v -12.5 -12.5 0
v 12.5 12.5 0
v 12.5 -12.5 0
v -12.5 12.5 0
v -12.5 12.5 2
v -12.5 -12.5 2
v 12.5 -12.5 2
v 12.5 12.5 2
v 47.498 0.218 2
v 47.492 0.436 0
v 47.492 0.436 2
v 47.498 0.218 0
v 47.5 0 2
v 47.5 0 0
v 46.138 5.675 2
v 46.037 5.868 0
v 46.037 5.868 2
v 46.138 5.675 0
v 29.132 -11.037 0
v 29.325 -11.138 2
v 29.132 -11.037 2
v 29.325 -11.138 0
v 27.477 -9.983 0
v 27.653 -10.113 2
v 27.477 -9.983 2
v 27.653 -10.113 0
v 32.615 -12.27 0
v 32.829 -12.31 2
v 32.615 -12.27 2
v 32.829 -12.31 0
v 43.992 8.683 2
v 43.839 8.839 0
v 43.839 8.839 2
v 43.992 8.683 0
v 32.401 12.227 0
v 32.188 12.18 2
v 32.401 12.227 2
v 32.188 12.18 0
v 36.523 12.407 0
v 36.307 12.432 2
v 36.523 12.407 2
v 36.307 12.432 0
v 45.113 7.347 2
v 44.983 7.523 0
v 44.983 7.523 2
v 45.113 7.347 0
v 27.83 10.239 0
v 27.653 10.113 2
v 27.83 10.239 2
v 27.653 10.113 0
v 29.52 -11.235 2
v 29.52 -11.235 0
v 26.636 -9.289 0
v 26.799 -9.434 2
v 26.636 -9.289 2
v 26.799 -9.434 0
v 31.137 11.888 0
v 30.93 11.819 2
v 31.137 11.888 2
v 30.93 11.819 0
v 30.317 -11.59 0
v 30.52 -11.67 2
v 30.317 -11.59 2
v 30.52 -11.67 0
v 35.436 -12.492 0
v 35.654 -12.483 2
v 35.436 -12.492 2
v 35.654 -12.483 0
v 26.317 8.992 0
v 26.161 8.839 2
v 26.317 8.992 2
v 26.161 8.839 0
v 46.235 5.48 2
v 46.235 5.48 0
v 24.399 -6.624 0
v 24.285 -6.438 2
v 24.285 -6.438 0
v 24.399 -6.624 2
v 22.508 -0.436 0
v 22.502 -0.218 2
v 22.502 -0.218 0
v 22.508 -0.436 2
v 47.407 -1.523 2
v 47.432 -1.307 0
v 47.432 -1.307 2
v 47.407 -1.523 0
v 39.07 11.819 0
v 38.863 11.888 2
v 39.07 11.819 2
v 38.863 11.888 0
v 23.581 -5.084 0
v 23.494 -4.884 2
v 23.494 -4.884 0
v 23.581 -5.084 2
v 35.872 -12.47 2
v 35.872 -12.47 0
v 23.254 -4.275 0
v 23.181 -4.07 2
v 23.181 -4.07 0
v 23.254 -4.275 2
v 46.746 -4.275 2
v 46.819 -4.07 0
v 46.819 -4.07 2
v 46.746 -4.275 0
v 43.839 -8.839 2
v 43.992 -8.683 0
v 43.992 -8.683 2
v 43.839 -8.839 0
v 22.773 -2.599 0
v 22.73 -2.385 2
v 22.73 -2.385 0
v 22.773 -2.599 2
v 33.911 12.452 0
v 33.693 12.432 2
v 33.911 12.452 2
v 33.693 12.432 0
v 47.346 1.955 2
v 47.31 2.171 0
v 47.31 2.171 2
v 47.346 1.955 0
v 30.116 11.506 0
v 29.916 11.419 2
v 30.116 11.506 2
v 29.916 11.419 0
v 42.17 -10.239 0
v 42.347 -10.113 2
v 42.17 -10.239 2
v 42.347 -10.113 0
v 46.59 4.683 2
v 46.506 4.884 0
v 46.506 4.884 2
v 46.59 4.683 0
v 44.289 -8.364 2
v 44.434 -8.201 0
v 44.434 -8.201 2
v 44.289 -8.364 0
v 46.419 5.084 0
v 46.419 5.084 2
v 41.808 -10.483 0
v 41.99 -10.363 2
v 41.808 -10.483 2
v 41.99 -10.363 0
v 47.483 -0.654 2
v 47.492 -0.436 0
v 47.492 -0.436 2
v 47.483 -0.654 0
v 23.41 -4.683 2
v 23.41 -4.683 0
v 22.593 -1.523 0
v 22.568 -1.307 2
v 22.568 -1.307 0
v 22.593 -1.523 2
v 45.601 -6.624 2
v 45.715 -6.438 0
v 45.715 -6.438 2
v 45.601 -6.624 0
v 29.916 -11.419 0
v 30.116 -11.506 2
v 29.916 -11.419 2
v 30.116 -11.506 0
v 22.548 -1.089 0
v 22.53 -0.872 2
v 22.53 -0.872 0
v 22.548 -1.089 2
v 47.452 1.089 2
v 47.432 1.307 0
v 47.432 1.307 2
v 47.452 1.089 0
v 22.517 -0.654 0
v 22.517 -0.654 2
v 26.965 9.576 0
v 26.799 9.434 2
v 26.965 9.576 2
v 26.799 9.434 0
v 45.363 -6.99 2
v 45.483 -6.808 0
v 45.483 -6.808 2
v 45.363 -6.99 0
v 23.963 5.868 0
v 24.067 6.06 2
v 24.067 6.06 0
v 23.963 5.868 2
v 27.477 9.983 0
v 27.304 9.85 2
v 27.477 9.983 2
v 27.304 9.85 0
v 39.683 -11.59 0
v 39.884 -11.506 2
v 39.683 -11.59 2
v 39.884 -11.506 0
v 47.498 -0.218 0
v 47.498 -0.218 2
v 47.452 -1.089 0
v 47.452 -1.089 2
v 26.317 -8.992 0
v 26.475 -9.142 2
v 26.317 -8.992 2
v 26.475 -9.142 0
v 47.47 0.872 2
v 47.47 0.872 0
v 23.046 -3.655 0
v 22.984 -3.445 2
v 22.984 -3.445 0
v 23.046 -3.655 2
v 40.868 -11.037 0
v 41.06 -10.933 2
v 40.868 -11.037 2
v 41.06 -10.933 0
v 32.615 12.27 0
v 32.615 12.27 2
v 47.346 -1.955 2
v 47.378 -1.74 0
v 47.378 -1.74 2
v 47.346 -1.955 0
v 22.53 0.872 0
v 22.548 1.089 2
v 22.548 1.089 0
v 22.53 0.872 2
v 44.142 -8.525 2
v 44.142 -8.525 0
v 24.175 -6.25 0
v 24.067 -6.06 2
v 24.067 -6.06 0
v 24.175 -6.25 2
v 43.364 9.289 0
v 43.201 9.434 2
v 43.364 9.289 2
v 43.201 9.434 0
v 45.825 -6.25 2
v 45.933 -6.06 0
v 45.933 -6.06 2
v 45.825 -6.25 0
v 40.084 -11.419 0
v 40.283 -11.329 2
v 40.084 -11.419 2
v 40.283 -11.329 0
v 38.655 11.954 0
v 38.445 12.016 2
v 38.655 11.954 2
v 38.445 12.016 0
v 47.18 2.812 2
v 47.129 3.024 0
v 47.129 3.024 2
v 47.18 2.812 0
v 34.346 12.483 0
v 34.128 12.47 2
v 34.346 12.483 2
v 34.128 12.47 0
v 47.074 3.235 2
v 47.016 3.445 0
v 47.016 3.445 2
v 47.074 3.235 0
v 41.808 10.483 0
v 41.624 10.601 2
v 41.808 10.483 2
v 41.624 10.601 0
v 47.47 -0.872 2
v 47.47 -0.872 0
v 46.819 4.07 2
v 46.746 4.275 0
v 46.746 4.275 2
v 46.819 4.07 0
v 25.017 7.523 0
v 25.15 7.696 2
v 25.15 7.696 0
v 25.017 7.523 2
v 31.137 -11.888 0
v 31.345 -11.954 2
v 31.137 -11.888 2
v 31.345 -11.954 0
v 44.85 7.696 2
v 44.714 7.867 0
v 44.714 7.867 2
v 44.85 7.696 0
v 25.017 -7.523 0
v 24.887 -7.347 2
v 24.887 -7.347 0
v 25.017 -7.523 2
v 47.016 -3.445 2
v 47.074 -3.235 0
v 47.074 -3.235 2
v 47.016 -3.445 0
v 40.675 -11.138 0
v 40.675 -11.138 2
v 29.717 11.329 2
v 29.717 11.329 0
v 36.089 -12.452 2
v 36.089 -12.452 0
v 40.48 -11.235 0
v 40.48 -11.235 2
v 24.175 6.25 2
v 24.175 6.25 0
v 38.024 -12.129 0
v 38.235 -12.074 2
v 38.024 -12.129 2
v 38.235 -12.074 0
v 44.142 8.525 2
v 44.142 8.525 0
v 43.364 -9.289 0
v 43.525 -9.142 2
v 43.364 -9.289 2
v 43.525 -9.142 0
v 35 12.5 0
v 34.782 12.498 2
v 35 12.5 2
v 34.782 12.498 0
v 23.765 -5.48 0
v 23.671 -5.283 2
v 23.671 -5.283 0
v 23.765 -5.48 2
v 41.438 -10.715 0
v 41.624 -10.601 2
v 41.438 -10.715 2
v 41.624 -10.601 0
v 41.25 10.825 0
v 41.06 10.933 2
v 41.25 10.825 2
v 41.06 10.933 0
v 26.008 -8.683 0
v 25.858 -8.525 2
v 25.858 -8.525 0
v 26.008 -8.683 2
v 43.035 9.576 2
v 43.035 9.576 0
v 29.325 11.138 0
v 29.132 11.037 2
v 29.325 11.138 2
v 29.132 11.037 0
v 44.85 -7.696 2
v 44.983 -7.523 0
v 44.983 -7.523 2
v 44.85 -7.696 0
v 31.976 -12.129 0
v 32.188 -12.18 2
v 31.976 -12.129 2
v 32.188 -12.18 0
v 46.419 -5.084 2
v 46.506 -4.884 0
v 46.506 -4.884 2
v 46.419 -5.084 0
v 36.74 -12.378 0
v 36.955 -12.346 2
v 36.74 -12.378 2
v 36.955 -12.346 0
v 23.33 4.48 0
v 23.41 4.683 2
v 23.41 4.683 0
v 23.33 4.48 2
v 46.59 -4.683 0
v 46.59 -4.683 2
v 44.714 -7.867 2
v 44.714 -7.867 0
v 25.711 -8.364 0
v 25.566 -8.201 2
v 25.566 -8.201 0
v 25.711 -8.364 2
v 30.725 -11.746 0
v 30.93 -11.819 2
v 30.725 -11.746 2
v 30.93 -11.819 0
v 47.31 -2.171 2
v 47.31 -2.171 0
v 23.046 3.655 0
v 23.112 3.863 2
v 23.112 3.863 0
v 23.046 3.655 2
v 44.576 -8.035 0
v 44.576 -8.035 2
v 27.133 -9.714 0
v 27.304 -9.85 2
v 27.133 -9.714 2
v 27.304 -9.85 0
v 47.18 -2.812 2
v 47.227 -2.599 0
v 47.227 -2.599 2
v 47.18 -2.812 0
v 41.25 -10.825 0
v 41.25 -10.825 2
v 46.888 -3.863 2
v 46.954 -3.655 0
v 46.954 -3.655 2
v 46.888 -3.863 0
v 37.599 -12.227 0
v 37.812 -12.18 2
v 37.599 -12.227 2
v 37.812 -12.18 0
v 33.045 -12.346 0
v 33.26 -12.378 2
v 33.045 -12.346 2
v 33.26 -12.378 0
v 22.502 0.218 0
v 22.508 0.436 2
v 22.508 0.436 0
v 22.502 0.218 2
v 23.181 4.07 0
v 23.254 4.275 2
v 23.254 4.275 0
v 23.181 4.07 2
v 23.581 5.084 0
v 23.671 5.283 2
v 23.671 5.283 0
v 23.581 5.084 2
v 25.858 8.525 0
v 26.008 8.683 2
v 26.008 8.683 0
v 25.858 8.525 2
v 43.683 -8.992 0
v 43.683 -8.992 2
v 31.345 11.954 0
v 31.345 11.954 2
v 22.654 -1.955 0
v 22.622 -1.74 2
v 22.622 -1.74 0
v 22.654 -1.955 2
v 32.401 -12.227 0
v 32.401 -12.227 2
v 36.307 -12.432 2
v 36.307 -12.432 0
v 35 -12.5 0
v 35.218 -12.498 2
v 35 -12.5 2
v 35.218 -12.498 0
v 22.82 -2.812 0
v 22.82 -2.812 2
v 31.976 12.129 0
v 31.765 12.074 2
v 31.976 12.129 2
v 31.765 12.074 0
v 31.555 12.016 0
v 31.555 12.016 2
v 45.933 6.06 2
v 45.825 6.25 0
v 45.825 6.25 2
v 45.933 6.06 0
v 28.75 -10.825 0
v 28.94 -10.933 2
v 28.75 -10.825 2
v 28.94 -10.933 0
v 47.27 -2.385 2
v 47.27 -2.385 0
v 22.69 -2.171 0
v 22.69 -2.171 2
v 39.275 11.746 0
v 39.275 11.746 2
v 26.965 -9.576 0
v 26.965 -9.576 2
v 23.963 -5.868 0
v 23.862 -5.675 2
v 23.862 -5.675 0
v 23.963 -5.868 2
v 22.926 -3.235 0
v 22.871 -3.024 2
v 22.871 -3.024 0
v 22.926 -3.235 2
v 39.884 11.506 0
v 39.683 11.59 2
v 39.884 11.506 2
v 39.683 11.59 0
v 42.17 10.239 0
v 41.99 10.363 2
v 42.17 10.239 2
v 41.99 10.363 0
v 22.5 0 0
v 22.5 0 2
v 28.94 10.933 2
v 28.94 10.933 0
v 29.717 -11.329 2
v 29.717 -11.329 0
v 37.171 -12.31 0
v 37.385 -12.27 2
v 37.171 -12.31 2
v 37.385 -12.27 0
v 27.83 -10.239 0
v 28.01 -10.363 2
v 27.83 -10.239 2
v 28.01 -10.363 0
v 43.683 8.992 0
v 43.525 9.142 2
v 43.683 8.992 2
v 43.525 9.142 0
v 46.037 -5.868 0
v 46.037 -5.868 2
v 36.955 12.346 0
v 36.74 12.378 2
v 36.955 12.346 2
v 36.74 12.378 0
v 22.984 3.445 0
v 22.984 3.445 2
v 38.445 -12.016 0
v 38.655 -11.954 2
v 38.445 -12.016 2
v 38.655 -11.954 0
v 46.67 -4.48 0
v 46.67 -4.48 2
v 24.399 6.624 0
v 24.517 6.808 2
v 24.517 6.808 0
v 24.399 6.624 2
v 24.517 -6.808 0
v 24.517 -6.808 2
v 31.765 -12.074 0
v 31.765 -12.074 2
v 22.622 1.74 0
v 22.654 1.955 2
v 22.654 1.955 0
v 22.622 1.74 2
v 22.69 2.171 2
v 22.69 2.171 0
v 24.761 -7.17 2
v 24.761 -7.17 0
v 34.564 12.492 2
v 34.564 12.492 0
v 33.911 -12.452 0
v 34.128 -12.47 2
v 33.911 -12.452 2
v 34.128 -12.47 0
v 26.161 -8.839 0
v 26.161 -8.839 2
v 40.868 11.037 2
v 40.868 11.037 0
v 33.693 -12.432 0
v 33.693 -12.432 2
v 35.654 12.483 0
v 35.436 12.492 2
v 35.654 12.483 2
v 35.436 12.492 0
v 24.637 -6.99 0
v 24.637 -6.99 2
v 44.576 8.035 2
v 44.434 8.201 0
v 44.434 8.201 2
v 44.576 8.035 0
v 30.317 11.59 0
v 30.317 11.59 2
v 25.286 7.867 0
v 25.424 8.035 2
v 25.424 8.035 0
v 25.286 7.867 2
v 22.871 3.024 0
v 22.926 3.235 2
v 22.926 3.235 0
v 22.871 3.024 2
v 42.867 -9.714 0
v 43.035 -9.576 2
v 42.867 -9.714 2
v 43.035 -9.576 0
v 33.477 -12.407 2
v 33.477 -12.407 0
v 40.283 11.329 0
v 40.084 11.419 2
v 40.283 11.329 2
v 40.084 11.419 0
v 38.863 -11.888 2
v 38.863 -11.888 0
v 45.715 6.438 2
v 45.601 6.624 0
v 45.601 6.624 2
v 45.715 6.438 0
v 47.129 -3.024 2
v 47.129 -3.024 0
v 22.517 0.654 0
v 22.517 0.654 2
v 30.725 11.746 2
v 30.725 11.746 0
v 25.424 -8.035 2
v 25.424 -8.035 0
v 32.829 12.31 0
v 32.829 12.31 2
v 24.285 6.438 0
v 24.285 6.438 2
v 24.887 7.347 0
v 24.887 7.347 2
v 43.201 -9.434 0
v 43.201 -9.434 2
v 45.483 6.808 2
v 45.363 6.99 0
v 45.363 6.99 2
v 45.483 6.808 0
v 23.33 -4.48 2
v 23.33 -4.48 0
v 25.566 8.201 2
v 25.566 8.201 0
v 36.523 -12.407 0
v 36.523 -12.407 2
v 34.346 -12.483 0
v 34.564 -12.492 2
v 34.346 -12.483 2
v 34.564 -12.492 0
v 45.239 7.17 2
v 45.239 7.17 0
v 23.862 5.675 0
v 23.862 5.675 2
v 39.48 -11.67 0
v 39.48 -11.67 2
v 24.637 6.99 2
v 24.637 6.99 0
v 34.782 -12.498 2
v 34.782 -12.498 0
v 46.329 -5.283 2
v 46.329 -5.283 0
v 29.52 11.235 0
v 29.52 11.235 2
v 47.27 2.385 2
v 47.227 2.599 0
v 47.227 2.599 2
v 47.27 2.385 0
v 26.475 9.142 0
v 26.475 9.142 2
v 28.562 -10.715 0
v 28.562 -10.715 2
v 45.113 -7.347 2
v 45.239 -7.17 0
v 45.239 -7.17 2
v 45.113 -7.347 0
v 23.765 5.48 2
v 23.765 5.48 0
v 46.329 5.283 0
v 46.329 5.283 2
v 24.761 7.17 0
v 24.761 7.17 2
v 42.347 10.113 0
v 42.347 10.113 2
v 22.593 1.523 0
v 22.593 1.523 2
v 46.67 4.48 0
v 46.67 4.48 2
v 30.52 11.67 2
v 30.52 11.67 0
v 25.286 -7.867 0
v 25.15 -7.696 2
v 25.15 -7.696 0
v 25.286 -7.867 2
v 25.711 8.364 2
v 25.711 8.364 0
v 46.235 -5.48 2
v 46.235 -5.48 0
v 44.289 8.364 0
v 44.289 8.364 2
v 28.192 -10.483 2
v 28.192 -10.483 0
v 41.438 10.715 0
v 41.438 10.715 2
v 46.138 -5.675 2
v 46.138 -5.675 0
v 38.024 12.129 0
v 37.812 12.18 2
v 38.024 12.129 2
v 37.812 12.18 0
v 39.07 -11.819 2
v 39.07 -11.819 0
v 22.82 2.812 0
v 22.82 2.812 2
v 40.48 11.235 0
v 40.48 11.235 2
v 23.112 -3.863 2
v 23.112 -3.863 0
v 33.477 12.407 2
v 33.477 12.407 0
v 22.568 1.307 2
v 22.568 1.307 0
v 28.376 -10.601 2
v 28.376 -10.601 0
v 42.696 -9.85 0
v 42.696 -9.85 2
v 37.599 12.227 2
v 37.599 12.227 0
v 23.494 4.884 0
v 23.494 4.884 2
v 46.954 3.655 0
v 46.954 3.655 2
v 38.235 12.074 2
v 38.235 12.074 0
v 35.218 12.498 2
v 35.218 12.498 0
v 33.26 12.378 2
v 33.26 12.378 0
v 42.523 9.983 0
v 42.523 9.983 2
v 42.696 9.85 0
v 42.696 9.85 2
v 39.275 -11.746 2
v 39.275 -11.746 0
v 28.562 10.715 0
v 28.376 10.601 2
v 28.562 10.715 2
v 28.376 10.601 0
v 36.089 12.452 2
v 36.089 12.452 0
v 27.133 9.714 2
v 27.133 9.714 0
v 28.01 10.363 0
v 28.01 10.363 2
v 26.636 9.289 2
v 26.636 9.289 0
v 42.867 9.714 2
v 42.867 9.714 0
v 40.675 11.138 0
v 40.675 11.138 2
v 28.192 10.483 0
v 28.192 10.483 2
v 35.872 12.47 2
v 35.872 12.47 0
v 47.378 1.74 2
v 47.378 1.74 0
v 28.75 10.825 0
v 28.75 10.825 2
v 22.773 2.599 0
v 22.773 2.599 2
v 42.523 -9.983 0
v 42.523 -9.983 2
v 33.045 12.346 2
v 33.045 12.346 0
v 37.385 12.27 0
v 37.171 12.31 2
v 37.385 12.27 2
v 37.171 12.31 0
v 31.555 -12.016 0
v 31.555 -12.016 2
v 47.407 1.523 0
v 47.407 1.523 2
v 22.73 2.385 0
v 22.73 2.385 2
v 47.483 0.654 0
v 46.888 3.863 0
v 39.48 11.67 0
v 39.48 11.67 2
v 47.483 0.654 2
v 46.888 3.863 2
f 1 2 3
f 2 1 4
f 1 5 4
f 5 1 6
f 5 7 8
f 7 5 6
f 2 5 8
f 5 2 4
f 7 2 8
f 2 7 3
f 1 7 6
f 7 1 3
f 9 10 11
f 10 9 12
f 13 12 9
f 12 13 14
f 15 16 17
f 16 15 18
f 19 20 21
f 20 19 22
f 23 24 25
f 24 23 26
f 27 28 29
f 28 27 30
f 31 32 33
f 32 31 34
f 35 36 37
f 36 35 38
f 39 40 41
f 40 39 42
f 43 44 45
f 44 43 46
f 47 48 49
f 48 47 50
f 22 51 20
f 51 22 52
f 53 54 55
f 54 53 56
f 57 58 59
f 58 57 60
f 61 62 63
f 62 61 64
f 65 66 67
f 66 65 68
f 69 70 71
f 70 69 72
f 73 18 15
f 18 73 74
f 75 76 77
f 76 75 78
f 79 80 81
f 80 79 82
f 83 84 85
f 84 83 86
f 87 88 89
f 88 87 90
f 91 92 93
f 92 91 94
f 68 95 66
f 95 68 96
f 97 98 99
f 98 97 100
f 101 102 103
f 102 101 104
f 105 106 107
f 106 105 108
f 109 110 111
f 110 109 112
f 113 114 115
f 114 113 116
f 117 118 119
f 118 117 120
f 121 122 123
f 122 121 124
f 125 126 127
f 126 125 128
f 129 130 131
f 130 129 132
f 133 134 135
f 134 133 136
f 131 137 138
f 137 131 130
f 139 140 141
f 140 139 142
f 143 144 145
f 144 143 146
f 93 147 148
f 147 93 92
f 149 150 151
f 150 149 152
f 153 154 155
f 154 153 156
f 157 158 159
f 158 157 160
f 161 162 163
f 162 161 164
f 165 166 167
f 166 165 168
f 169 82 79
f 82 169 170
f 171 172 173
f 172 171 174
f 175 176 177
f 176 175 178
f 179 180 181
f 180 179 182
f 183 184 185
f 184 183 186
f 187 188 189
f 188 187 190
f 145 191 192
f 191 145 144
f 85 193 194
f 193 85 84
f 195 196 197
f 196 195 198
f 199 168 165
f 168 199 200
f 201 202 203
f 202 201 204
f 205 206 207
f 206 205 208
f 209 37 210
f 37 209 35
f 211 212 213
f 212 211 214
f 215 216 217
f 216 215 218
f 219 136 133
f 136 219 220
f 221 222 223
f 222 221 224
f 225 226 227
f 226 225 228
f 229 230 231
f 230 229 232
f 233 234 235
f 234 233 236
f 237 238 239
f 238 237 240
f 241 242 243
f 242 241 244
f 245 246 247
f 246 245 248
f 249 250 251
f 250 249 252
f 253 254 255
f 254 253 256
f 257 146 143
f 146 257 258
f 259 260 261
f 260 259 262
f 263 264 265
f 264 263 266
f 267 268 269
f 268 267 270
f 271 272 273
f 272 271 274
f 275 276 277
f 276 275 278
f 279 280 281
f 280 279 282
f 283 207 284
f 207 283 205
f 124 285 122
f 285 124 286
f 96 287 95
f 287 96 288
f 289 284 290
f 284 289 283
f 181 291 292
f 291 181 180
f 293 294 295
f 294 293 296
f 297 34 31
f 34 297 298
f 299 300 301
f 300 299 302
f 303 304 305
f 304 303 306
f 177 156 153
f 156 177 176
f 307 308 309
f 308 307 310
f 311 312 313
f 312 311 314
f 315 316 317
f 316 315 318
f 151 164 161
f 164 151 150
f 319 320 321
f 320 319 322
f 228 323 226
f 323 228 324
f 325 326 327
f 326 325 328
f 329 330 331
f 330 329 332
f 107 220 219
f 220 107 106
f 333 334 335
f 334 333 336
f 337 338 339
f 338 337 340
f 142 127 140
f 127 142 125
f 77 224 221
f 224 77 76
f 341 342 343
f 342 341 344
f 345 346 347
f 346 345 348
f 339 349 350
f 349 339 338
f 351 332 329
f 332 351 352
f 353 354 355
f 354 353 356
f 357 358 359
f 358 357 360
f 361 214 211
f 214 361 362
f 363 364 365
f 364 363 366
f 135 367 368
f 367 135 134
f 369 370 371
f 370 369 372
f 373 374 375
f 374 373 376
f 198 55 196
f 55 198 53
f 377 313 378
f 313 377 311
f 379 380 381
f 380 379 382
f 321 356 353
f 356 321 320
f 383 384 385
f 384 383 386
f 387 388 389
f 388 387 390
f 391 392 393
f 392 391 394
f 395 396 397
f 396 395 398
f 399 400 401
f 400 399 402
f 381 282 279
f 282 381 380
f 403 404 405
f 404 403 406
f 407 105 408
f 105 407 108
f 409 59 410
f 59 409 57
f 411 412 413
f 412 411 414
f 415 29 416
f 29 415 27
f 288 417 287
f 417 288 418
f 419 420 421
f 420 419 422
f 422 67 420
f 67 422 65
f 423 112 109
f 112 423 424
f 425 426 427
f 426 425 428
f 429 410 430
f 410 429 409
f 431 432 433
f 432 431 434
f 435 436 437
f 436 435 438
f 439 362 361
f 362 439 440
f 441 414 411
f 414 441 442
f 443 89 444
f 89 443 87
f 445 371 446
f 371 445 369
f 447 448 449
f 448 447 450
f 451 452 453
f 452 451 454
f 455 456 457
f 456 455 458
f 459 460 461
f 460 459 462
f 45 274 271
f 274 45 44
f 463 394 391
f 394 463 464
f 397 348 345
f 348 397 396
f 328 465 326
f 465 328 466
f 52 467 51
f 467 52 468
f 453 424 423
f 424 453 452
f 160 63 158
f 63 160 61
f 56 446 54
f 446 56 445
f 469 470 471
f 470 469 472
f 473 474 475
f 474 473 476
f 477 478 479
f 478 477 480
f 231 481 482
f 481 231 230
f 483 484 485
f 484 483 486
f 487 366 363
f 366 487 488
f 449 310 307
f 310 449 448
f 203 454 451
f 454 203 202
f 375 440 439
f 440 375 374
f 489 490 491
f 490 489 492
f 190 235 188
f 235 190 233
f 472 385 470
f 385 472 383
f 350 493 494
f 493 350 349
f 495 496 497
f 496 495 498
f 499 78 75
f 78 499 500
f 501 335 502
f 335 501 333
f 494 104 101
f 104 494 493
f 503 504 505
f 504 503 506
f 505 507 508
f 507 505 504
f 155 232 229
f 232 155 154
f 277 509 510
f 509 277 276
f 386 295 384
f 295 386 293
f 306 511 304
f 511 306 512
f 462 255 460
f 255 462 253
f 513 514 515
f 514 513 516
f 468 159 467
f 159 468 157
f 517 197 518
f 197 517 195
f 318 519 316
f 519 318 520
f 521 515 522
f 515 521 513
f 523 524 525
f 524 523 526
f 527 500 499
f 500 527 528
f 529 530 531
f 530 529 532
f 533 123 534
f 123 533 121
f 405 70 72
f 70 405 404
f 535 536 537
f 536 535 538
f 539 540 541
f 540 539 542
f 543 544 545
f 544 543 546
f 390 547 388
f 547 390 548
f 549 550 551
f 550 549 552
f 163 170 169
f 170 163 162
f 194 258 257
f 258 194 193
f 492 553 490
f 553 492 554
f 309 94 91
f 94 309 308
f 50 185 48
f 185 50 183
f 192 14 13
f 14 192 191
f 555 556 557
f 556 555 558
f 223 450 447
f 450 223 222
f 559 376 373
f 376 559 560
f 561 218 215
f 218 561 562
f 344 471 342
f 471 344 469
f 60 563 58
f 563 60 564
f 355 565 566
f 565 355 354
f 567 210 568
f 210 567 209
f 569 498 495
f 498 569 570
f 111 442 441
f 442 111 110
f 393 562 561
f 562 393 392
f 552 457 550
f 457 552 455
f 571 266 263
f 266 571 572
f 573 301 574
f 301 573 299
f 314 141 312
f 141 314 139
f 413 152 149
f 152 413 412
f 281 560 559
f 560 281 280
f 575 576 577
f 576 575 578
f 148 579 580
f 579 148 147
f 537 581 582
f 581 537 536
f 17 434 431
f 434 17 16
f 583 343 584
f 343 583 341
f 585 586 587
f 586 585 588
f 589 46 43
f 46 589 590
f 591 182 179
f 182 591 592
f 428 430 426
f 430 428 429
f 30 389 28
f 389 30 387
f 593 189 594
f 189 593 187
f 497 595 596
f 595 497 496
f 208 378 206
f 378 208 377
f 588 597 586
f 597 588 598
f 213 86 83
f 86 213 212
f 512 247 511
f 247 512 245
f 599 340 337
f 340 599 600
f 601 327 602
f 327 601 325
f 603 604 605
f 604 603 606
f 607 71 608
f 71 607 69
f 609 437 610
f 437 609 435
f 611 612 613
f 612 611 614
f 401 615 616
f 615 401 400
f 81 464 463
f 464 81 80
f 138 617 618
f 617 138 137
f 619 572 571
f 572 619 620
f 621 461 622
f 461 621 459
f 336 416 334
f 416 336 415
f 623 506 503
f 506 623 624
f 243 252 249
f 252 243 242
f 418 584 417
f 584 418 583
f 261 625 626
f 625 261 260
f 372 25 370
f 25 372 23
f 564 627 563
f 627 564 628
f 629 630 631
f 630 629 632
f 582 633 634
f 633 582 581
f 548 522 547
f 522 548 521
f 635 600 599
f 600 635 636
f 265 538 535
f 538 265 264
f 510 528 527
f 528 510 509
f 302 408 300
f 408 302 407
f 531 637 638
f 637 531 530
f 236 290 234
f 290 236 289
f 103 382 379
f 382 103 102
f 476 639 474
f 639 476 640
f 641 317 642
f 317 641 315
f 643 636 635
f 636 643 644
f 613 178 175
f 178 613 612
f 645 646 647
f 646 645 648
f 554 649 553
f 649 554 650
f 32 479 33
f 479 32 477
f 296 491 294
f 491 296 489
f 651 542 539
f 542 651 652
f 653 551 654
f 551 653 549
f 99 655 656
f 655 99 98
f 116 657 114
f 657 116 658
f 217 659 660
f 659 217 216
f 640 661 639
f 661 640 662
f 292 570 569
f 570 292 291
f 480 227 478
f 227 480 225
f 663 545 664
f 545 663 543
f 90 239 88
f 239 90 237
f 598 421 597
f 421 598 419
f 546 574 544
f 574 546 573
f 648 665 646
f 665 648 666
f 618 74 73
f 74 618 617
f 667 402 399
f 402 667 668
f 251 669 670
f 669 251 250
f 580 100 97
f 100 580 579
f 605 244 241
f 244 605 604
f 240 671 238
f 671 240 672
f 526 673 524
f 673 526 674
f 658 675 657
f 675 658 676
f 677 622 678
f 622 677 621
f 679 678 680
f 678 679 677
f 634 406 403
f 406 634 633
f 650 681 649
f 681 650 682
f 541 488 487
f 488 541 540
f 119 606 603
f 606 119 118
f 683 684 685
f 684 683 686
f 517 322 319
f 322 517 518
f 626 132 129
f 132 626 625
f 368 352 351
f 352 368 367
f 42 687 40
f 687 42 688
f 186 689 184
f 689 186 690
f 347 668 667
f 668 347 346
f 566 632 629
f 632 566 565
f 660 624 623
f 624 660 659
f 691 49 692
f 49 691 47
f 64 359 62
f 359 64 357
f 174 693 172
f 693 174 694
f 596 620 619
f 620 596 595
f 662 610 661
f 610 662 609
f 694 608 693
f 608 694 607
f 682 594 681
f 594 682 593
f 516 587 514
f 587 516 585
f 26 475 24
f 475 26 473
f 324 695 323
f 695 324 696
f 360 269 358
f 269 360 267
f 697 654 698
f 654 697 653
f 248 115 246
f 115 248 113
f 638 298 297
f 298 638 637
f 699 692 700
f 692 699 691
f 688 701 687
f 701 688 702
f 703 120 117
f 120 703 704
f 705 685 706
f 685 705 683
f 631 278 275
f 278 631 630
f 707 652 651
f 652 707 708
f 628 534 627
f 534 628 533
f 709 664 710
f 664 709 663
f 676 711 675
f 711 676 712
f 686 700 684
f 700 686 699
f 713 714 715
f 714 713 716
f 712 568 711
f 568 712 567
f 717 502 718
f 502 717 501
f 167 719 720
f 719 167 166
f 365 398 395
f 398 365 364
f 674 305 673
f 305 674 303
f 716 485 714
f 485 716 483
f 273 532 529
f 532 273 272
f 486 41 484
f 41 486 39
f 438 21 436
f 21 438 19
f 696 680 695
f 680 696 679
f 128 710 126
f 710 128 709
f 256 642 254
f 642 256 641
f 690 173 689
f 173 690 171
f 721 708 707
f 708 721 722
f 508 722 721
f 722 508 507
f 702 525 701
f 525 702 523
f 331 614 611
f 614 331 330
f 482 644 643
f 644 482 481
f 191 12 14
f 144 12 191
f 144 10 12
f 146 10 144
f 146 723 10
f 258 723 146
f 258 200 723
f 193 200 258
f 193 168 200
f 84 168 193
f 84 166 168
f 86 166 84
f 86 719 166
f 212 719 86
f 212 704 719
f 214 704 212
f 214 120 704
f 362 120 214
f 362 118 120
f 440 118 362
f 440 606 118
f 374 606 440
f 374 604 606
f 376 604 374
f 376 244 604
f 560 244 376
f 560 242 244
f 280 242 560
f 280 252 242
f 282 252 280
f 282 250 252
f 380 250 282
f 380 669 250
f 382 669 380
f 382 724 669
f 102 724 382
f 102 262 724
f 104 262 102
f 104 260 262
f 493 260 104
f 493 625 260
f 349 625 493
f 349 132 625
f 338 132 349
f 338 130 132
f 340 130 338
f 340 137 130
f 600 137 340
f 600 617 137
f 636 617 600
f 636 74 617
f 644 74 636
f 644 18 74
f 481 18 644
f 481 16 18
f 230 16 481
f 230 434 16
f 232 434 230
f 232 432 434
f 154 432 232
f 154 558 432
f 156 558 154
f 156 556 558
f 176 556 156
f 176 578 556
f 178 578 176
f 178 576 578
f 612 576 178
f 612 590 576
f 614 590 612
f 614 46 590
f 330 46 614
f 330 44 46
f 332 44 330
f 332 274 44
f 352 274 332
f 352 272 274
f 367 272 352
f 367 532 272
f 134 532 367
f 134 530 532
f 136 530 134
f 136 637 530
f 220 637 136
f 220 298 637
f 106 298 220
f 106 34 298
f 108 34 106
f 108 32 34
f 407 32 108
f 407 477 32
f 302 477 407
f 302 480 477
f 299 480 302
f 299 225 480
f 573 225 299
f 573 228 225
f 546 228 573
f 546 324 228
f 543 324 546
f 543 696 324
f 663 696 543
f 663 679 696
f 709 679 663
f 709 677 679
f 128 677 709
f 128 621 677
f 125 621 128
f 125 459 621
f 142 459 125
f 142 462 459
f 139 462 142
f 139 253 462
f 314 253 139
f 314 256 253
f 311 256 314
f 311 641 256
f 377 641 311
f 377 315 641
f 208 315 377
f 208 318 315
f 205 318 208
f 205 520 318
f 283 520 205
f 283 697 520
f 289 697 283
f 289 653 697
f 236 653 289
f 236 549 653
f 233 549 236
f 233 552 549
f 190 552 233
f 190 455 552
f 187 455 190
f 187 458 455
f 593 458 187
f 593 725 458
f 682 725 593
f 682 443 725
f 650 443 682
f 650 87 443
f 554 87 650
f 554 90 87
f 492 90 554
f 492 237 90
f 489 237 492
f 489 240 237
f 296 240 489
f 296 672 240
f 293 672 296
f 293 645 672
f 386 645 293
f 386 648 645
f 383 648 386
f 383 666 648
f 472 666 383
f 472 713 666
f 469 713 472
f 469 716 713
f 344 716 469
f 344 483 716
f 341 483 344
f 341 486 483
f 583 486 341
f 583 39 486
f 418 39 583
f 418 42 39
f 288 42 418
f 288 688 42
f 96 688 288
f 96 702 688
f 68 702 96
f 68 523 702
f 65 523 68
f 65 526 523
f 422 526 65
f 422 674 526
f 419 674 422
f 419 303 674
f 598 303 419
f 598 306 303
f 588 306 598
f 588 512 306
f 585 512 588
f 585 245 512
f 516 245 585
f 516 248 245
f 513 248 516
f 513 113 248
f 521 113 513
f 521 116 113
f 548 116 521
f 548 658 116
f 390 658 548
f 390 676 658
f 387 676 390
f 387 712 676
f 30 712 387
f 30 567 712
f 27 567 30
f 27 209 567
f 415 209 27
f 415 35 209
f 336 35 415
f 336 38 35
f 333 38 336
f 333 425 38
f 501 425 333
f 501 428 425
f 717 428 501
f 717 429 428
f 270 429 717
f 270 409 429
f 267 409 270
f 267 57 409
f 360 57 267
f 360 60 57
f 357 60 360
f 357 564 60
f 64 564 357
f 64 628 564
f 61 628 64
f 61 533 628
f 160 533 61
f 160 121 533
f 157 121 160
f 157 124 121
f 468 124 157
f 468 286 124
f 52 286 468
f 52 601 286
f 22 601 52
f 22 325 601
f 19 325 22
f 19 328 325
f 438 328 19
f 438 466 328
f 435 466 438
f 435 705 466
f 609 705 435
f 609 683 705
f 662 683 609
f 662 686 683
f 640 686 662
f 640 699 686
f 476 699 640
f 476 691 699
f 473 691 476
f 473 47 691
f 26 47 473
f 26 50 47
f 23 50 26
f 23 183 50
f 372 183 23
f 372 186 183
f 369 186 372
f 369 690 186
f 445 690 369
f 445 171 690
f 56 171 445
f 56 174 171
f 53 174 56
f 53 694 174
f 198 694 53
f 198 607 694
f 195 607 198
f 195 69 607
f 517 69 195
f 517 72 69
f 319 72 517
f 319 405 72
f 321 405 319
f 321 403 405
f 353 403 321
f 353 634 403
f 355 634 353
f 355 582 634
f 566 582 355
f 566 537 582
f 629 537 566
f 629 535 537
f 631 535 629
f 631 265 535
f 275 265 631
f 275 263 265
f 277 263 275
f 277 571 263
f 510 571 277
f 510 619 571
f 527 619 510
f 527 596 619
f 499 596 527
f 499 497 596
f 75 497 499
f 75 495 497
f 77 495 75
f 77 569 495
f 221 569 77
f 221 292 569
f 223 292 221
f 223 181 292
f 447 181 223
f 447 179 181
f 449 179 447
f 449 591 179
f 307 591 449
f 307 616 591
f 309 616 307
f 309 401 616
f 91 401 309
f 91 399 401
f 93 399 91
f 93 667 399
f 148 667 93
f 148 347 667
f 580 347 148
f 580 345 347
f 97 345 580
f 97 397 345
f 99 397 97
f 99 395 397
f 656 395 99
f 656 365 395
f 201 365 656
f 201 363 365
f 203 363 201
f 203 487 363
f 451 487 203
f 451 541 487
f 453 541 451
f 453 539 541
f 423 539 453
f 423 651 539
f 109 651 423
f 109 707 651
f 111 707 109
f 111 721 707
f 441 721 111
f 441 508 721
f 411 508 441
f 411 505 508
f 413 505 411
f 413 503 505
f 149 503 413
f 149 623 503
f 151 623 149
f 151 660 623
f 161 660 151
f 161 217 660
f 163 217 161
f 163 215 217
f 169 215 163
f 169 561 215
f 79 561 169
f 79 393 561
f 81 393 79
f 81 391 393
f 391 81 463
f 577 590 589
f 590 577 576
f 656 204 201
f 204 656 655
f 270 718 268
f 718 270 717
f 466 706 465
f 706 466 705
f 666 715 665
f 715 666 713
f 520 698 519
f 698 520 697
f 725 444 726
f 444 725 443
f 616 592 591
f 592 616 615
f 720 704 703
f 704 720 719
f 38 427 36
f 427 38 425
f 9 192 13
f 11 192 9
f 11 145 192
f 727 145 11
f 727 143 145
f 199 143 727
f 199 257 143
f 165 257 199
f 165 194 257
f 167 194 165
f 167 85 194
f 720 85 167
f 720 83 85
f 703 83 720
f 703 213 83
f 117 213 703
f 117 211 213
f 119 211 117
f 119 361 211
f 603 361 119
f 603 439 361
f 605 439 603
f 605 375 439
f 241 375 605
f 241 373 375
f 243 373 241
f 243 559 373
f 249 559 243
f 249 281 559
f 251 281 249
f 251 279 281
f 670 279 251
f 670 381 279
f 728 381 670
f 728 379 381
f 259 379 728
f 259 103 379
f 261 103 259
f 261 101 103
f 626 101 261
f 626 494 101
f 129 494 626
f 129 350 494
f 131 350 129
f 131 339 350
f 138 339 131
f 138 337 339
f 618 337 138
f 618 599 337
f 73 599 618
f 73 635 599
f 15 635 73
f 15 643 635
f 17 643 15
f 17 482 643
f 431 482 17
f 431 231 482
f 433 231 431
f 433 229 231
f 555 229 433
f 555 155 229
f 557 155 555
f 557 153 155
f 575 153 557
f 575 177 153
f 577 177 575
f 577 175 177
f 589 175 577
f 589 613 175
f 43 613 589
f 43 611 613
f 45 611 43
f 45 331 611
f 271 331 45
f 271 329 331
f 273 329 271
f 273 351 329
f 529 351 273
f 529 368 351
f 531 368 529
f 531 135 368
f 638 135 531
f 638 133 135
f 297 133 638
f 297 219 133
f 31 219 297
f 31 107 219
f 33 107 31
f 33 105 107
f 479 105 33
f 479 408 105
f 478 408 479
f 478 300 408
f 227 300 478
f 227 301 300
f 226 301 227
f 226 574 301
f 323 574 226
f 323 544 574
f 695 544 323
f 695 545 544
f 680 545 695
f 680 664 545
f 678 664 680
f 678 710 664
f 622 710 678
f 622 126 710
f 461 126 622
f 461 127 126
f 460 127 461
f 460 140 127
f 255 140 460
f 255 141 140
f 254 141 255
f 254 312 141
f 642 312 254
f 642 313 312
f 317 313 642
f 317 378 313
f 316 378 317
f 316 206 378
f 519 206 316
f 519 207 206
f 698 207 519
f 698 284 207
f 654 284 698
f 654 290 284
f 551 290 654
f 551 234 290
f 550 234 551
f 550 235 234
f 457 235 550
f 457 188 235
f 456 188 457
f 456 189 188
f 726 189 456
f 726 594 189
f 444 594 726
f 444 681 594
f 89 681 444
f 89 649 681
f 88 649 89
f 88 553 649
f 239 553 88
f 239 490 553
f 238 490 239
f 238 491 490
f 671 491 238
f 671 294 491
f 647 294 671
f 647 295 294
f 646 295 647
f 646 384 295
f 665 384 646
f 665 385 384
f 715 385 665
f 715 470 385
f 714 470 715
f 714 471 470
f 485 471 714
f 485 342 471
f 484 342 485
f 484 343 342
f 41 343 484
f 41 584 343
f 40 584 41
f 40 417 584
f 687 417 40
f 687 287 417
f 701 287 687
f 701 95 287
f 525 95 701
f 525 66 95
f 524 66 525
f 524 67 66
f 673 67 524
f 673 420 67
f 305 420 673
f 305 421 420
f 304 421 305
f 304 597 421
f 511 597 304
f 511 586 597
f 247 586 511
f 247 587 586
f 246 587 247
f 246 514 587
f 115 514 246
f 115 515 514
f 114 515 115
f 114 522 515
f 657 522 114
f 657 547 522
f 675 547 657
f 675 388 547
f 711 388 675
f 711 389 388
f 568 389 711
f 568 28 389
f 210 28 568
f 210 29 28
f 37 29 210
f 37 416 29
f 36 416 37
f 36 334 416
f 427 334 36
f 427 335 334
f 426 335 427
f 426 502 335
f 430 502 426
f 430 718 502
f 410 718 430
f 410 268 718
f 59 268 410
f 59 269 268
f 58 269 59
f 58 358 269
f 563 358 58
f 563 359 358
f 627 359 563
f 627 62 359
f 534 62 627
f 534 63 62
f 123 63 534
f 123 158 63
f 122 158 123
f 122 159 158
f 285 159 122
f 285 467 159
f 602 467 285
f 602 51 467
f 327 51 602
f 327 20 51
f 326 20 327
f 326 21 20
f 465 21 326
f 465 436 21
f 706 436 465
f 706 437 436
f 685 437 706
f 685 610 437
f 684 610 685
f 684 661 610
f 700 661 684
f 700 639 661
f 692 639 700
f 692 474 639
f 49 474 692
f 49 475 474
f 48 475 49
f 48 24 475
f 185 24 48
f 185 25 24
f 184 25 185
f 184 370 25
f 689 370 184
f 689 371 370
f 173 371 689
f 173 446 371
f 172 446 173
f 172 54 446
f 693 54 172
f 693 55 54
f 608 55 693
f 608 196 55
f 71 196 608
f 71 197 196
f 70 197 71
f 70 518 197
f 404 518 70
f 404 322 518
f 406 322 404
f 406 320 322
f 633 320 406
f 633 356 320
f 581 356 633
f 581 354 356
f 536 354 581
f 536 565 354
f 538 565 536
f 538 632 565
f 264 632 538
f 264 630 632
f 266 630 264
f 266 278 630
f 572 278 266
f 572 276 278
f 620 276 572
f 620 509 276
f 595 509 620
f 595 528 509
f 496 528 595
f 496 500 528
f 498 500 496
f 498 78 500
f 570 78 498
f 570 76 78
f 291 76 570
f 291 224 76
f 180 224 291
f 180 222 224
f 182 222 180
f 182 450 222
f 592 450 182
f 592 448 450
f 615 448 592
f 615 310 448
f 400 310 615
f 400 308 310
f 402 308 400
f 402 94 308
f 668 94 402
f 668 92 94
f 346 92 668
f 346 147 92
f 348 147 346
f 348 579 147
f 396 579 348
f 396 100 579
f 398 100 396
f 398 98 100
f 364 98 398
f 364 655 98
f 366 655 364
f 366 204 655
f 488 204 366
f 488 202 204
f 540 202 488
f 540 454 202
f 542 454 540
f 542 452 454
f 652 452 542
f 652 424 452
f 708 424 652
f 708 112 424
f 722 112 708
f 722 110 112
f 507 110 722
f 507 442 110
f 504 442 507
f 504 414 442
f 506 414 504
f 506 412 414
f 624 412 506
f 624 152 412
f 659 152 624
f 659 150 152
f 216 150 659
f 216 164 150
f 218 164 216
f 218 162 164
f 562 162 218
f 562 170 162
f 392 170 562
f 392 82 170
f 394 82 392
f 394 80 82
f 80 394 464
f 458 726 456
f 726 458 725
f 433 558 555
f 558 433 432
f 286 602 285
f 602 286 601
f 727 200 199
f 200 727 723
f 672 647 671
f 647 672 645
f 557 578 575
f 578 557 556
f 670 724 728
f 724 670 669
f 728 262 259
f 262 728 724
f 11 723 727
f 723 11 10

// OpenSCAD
$fn=360;
size=25;
height=2;
linear_extrude(height)
square([size,size],center=true);

translate([size+10,0,0])
linear_extrude(height)
circle(d=size);
